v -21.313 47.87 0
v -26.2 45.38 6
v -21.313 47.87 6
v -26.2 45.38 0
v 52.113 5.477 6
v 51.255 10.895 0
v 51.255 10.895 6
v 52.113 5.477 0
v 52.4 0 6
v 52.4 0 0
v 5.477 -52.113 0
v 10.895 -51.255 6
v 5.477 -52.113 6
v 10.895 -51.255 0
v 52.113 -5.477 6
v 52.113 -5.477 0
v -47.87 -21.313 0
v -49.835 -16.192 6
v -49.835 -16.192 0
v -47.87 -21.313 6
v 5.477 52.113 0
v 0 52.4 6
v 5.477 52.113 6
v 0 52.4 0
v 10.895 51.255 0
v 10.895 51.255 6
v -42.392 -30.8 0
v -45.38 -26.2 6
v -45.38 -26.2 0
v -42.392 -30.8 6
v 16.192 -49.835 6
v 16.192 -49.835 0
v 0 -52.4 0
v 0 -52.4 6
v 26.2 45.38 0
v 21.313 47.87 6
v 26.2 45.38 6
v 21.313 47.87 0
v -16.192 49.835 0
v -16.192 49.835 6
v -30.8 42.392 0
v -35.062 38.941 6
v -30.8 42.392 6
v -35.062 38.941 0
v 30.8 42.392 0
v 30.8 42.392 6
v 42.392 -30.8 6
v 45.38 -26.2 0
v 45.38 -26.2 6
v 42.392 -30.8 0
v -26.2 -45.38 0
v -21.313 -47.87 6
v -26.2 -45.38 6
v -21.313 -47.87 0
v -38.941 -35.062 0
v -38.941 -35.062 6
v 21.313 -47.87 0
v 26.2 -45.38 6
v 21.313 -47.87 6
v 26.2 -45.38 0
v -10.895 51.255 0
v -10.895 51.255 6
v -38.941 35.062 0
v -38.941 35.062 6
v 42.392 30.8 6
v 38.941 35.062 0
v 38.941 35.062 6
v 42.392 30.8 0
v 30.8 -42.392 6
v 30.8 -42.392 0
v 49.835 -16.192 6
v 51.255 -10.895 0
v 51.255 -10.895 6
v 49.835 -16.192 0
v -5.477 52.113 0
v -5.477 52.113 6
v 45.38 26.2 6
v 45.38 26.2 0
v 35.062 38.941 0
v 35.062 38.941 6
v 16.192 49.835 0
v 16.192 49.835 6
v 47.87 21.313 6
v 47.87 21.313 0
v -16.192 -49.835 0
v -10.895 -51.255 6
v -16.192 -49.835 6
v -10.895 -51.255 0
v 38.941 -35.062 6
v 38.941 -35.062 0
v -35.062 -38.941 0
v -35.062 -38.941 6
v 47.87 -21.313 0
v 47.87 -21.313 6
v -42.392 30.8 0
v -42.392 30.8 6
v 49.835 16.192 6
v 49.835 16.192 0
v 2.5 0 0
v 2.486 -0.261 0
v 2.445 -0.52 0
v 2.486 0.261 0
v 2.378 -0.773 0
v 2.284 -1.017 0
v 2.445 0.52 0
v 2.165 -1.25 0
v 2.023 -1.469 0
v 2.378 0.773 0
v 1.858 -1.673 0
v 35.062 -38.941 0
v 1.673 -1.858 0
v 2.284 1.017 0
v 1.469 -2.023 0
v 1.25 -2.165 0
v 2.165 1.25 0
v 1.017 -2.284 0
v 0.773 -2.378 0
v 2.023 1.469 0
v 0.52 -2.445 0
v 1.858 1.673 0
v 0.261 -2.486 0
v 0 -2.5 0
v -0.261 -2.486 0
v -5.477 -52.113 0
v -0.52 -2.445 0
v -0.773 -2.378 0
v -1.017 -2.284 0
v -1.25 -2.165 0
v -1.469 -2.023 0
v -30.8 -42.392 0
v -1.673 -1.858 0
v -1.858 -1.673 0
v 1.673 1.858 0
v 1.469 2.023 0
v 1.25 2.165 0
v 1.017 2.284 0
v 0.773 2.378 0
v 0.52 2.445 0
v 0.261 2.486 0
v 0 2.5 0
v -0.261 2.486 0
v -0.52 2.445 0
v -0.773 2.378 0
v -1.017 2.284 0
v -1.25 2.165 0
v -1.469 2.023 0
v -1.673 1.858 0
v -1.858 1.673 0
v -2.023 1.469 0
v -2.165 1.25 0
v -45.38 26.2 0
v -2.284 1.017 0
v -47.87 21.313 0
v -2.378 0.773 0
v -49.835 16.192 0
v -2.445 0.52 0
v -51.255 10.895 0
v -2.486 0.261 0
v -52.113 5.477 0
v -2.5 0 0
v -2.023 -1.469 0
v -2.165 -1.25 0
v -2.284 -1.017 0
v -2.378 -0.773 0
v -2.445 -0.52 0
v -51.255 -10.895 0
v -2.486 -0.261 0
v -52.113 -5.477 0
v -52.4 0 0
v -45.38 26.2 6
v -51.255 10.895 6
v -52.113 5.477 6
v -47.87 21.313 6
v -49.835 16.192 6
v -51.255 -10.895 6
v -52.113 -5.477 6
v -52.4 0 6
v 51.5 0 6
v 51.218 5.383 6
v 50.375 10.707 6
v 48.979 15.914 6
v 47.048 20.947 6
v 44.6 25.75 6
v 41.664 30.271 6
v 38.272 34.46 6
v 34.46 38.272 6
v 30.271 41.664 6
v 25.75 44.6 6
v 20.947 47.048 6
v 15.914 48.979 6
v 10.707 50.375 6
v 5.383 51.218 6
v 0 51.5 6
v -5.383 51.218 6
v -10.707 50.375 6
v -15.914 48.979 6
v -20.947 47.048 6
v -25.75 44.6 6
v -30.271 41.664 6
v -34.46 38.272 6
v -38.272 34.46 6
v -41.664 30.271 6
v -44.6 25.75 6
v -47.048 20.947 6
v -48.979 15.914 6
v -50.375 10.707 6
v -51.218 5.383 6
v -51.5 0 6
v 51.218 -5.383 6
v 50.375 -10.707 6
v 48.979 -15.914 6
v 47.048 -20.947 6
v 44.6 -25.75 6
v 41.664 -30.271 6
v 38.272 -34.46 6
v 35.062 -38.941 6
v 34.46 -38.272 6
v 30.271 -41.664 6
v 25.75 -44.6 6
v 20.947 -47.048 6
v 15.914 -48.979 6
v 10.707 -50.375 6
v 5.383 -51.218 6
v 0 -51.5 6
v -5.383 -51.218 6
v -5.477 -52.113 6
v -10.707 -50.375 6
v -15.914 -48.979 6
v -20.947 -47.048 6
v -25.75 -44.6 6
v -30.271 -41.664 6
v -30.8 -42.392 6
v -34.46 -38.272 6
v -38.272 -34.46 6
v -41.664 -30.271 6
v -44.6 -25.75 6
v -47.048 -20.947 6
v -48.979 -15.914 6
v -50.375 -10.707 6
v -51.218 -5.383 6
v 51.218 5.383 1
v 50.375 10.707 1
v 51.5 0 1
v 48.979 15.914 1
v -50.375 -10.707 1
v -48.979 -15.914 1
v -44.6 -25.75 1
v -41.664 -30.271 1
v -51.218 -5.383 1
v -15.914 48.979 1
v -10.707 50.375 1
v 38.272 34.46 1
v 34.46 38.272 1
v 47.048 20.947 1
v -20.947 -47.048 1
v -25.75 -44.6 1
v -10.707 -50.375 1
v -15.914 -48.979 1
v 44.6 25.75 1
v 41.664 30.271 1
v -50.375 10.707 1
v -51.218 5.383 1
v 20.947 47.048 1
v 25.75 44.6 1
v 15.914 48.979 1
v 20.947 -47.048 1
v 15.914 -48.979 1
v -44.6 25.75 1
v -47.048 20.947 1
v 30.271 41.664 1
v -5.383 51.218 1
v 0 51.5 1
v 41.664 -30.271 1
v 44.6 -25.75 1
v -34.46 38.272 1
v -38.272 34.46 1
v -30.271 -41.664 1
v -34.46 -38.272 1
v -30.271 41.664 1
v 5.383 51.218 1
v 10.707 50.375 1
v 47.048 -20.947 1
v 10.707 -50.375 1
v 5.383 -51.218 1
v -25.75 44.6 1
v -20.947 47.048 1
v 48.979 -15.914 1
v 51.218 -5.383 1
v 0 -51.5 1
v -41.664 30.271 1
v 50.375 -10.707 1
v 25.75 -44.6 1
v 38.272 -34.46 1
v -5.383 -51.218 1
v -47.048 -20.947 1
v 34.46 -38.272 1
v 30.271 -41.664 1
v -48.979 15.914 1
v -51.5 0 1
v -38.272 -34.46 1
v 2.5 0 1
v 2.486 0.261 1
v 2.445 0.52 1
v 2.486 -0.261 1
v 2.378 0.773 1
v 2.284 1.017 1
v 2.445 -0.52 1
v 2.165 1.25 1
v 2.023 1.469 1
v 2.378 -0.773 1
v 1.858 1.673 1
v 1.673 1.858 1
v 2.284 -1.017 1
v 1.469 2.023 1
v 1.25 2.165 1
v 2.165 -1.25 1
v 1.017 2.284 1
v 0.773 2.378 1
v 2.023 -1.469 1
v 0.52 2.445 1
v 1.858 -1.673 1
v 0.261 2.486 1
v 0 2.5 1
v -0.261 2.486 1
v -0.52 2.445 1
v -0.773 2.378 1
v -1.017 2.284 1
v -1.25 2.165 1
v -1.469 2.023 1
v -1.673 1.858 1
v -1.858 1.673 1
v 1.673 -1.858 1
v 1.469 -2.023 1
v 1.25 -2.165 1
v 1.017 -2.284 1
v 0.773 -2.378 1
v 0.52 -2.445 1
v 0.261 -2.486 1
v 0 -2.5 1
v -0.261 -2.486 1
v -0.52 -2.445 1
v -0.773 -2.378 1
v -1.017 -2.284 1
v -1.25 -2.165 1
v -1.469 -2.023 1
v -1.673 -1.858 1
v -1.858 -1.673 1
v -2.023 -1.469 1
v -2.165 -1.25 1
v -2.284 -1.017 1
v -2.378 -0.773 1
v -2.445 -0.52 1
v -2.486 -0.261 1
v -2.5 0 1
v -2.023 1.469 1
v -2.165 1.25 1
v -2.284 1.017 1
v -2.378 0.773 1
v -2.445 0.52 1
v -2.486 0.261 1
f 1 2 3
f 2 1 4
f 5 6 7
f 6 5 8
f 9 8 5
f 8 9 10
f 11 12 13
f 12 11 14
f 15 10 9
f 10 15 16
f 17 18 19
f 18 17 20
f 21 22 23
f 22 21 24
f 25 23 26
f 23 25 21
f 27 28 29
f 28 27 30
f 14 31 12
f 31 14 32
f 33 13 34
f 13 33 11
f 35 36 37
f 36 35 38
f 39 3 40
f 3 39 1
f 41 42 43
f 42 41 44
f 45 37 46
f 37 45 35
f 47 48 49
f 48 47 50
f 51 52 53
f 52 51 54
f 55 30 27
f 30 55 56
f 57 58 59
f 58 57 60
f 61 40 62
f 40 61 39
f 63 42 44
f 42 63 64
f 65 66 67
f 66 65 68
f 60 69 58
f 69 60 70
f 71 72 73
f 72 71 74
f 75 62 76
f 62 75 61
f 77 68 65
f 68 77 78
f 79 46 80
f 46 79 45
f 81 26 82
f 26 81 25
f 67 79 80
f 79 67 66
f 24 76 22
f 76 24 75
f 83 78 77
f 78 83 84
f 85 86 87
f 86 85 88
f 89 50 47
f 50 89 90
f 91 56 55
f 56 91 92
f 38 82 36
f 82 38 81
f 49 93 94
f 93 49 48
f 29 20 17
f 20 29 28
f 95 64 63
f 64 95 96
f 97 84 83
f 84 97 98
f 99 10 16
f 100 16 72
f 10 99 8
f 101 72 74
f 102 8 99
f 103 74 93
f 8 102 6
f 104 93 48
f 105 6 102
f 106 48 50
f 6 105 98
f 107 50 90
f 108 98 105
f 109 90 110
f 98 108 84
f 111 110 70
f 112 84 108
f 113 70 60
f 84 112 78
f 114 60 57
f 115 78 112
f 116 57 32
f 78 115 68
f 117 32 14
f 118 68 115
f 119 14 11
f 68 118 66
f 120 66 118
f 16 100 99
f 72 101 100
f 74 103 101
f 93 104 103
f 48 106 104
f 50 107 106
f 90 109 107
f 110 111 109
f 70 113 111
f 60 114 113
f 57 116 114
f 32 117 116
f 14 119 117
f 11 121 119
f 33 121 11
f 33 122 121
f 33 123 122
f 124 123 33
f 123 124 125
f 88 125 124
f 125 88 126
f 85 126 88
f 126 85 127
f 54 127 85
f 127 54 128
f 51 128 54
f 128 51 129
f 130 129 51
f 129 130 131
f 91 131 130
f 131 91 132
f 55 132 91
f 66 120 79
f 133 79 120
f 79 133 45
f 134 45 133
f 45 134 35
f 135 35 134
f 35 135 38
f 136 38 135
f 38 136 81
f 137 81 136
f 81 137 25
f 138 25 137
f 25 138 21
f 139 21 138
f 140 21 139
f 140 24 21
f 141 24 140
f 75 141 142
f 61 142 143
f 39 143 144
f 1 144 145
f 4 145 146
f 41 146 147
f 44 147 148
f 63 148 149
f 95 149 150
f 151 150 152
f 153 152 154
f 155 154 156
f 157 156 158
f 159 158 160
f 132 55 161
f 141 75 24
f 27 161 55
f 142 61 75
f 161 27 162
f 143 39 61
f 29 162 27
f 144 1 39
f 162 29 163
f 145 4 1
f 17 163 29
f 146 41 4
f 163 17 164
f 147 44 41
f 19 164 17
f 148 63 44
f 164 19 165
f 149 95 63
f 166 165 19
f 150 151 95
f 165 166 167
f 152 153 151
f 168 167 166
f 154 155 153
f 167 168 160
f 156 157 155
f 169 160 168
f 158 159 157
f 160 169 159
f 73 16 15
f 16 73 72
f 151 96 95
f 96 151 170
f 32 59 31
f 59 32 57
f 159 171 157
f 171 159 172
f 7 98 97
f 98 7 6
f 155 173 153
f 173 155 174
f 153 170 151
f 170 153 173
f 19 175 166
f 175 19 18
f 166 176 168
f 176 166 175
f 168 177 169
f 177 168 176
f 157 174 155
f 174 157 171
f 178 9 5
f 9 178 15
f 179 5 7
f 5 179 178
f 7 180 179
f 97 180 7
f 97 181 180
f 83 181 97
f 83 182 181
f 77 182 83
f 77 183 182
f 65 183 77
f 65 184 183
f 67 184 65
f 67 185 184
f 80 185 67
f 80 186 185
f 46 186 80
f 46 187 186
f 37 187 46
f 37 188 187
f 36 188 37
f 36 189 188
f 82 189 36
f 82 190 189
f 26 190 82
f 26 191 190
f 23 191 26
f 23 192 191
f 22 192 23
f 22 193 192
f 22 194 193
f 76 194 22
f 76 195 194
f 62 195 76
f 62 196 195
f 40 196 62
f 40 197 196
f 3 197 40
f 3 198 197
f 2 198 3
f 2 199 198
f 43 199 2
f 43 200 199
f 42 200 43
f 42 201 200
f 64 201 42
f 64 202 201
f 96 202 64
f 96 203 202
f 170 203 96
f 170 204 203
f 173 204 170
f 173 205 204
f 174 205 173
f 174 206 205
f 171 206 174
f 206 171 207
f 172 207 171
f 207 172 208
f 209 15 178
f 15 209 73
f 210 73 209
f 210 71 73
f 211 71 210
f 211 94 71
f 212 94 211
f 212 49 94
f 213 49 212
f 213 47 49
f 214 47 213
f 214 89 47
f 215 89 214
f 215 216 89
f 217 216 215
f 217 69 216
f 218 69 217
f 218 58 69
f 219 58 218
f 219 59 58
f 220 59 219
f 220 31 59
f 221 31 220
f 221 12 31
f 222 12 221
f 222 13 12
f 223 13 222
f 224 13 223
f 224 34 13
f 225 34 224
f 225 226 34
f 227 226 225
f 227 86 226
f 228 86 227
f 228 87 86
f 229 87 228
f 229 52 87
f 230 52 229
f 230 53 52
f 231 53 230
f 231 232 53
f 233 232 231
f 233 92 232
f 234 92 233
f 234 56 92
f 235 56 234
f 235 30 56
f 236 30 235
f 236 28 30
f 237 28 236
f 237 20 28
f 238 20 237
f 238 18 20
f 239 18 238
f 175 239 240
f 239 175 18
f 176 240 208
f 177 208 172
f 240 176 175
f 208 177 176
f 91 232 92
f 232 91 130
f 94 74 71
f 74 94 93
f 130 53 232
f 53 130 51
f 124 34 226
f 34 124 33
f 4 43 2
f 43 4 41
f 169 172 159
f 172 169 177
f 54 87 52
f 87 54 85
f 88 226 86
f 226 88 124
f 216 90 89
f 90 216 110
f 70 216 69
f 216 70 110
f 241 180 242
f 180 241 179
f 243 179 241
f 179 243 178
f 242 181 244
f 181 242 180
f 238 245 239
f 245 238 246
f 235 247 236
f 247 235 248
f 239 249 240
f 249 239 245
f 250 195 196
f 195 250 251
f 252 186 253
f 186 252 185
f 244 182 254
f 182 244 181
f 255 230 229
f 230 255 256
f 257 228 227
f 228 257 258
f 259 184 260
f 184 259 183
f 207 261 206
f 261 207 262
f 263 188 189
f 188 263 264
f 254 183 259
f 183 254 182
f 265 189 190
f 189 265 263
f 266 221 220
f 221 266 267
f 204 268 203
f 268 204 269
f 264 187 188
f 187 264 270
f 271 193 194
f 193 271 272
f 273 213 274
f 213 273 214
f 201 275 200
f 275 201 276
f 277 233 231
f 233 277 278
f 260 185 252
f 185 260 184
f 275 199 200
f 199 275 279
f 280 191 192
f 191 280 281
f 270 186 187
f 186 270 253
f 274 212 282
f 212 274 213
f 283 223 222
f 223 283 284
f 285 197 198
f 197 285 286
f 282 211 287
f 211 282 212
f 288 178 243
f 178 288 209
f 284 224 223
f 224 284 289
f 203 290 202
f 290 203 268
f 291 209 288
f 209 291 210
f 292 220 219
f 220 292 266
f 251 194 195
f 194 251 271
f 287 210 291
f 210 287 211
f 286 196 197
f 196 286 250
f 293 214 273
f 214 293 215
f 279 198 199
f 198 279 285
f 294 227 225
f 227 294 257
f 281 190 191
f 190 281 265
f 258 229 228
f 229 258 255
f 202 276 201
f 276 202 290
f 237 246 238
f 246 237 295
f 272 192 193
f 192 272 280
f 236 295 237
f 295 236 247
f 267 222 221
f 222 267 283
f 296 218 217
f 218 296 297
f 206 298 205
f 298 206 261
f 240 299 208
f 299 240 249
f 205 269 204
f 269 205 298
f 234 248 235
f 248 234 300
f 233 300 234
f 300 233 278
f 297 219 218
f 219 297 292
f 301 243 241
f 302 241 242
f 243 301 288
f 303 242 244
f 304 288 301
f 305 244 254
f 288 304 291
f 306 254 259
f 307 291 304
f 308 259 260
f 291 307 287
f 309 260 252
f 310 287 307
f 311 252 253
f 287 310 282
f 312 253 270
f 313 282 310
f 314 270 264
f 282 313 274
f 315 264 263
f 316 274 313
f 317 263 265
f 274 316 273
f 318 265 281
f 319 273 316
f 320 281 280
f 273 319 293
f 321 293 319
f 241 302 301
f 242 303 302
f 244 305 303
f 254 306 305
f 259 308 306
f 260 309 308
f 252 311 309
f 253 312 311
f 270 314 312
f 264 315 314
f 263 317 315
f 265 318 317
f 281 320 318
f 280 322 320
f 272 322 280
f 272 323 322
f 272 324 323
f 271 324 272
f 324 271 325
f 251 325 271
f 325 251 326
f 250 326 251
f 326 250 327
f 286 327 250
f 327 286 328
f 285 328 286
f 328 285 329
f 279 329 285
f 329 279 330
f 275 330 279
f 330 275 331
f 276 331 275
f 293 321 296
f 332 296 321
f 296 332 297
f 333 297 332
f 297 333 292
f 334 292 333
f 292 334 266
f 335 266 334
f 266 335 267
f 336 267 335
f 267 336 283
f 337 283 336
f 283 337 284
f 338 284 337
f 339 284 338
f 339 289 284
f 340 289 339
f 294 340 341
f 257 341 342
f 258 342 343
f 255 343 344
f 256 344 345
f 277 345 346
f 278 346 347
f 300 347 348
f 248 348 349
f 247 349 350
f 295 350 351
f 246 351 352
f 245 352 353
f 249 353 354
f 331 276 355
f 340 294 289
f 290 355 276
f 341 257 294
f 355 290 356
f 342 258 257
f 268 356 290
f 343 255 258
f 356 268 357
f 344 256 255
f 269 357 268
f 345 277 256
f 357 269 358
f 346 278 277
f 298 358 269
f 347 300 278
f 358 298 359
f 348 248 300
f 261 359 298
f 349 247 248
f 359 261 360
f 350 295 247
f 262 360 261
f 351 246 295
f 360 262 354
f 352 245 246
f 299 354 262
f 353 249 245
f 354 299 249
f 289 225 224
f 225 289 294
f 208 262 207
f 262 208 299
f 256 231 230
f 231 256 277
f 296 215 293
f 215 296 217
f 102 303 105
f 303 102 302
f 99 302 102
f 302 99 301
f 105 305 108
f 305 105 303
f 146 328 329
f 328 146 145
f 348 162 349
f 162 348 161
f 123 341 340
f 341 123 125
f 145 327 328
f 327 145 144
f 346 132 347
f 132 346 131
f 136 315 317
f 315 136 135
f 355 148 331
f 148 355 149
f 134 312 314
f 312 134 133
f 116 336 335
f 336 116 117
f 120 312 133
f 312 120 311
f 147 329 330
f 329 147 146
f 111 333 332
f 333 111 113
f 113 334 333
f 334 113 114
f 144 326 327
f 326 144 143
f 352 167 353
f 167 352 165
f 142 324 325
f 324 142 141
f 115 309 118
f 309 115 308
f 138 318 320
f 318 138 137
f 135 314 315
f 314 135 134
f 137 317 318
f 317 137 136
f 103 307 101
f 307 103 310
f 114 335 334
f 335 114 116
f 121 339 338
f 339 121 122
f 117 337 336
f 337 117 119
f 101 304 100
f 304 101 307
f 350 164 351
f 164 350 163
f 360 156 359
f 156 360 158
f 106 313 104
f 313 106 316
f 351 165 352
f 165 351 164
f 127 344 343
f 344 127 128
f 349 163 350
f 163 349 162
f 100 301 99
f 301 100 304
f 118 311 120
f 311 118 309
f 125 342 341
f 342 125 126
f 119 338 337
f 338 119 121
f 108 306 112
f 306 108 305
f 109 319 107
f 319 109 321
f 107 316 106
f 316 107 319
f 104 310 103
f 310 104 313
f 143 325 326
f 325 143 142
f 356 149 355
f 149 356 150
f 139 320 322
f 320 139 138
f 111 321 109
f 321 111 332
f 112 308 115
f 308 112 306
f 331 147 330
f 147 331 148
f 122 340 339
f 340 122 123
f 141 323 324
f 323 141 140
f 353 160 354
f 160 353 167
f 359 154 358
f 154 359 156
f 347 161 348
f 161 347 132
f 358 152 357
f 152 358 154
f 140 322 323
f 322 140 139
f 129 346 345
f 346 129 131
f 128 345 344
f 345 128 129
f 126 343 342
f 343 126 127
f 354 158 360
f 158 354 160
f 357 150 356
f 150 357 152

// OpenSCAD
// Designed by Bella, 4 years old (Daddy helped with the measuring and typing)

Diameter = 103;  // Cup Mouth Diameter
thickness = 6; // Total thickness, top to bottom
WallThickness = .9; // Lid rim thickness. Adds to total diameter
LidThickness = 1; // Thickness of the lid. Does not add to total thickness.

$fn = 60; // Circle Smoothness. 

difference()
{
	cylinder(d=Diameter + (WallThickness*2), h=thickness);
	translate([0,0,LidThickness]) cylinder(d=Diameter, h=thickness);
	translate([0,0,0]) cylinder(d=5, h=thickness); // straw hole

}
